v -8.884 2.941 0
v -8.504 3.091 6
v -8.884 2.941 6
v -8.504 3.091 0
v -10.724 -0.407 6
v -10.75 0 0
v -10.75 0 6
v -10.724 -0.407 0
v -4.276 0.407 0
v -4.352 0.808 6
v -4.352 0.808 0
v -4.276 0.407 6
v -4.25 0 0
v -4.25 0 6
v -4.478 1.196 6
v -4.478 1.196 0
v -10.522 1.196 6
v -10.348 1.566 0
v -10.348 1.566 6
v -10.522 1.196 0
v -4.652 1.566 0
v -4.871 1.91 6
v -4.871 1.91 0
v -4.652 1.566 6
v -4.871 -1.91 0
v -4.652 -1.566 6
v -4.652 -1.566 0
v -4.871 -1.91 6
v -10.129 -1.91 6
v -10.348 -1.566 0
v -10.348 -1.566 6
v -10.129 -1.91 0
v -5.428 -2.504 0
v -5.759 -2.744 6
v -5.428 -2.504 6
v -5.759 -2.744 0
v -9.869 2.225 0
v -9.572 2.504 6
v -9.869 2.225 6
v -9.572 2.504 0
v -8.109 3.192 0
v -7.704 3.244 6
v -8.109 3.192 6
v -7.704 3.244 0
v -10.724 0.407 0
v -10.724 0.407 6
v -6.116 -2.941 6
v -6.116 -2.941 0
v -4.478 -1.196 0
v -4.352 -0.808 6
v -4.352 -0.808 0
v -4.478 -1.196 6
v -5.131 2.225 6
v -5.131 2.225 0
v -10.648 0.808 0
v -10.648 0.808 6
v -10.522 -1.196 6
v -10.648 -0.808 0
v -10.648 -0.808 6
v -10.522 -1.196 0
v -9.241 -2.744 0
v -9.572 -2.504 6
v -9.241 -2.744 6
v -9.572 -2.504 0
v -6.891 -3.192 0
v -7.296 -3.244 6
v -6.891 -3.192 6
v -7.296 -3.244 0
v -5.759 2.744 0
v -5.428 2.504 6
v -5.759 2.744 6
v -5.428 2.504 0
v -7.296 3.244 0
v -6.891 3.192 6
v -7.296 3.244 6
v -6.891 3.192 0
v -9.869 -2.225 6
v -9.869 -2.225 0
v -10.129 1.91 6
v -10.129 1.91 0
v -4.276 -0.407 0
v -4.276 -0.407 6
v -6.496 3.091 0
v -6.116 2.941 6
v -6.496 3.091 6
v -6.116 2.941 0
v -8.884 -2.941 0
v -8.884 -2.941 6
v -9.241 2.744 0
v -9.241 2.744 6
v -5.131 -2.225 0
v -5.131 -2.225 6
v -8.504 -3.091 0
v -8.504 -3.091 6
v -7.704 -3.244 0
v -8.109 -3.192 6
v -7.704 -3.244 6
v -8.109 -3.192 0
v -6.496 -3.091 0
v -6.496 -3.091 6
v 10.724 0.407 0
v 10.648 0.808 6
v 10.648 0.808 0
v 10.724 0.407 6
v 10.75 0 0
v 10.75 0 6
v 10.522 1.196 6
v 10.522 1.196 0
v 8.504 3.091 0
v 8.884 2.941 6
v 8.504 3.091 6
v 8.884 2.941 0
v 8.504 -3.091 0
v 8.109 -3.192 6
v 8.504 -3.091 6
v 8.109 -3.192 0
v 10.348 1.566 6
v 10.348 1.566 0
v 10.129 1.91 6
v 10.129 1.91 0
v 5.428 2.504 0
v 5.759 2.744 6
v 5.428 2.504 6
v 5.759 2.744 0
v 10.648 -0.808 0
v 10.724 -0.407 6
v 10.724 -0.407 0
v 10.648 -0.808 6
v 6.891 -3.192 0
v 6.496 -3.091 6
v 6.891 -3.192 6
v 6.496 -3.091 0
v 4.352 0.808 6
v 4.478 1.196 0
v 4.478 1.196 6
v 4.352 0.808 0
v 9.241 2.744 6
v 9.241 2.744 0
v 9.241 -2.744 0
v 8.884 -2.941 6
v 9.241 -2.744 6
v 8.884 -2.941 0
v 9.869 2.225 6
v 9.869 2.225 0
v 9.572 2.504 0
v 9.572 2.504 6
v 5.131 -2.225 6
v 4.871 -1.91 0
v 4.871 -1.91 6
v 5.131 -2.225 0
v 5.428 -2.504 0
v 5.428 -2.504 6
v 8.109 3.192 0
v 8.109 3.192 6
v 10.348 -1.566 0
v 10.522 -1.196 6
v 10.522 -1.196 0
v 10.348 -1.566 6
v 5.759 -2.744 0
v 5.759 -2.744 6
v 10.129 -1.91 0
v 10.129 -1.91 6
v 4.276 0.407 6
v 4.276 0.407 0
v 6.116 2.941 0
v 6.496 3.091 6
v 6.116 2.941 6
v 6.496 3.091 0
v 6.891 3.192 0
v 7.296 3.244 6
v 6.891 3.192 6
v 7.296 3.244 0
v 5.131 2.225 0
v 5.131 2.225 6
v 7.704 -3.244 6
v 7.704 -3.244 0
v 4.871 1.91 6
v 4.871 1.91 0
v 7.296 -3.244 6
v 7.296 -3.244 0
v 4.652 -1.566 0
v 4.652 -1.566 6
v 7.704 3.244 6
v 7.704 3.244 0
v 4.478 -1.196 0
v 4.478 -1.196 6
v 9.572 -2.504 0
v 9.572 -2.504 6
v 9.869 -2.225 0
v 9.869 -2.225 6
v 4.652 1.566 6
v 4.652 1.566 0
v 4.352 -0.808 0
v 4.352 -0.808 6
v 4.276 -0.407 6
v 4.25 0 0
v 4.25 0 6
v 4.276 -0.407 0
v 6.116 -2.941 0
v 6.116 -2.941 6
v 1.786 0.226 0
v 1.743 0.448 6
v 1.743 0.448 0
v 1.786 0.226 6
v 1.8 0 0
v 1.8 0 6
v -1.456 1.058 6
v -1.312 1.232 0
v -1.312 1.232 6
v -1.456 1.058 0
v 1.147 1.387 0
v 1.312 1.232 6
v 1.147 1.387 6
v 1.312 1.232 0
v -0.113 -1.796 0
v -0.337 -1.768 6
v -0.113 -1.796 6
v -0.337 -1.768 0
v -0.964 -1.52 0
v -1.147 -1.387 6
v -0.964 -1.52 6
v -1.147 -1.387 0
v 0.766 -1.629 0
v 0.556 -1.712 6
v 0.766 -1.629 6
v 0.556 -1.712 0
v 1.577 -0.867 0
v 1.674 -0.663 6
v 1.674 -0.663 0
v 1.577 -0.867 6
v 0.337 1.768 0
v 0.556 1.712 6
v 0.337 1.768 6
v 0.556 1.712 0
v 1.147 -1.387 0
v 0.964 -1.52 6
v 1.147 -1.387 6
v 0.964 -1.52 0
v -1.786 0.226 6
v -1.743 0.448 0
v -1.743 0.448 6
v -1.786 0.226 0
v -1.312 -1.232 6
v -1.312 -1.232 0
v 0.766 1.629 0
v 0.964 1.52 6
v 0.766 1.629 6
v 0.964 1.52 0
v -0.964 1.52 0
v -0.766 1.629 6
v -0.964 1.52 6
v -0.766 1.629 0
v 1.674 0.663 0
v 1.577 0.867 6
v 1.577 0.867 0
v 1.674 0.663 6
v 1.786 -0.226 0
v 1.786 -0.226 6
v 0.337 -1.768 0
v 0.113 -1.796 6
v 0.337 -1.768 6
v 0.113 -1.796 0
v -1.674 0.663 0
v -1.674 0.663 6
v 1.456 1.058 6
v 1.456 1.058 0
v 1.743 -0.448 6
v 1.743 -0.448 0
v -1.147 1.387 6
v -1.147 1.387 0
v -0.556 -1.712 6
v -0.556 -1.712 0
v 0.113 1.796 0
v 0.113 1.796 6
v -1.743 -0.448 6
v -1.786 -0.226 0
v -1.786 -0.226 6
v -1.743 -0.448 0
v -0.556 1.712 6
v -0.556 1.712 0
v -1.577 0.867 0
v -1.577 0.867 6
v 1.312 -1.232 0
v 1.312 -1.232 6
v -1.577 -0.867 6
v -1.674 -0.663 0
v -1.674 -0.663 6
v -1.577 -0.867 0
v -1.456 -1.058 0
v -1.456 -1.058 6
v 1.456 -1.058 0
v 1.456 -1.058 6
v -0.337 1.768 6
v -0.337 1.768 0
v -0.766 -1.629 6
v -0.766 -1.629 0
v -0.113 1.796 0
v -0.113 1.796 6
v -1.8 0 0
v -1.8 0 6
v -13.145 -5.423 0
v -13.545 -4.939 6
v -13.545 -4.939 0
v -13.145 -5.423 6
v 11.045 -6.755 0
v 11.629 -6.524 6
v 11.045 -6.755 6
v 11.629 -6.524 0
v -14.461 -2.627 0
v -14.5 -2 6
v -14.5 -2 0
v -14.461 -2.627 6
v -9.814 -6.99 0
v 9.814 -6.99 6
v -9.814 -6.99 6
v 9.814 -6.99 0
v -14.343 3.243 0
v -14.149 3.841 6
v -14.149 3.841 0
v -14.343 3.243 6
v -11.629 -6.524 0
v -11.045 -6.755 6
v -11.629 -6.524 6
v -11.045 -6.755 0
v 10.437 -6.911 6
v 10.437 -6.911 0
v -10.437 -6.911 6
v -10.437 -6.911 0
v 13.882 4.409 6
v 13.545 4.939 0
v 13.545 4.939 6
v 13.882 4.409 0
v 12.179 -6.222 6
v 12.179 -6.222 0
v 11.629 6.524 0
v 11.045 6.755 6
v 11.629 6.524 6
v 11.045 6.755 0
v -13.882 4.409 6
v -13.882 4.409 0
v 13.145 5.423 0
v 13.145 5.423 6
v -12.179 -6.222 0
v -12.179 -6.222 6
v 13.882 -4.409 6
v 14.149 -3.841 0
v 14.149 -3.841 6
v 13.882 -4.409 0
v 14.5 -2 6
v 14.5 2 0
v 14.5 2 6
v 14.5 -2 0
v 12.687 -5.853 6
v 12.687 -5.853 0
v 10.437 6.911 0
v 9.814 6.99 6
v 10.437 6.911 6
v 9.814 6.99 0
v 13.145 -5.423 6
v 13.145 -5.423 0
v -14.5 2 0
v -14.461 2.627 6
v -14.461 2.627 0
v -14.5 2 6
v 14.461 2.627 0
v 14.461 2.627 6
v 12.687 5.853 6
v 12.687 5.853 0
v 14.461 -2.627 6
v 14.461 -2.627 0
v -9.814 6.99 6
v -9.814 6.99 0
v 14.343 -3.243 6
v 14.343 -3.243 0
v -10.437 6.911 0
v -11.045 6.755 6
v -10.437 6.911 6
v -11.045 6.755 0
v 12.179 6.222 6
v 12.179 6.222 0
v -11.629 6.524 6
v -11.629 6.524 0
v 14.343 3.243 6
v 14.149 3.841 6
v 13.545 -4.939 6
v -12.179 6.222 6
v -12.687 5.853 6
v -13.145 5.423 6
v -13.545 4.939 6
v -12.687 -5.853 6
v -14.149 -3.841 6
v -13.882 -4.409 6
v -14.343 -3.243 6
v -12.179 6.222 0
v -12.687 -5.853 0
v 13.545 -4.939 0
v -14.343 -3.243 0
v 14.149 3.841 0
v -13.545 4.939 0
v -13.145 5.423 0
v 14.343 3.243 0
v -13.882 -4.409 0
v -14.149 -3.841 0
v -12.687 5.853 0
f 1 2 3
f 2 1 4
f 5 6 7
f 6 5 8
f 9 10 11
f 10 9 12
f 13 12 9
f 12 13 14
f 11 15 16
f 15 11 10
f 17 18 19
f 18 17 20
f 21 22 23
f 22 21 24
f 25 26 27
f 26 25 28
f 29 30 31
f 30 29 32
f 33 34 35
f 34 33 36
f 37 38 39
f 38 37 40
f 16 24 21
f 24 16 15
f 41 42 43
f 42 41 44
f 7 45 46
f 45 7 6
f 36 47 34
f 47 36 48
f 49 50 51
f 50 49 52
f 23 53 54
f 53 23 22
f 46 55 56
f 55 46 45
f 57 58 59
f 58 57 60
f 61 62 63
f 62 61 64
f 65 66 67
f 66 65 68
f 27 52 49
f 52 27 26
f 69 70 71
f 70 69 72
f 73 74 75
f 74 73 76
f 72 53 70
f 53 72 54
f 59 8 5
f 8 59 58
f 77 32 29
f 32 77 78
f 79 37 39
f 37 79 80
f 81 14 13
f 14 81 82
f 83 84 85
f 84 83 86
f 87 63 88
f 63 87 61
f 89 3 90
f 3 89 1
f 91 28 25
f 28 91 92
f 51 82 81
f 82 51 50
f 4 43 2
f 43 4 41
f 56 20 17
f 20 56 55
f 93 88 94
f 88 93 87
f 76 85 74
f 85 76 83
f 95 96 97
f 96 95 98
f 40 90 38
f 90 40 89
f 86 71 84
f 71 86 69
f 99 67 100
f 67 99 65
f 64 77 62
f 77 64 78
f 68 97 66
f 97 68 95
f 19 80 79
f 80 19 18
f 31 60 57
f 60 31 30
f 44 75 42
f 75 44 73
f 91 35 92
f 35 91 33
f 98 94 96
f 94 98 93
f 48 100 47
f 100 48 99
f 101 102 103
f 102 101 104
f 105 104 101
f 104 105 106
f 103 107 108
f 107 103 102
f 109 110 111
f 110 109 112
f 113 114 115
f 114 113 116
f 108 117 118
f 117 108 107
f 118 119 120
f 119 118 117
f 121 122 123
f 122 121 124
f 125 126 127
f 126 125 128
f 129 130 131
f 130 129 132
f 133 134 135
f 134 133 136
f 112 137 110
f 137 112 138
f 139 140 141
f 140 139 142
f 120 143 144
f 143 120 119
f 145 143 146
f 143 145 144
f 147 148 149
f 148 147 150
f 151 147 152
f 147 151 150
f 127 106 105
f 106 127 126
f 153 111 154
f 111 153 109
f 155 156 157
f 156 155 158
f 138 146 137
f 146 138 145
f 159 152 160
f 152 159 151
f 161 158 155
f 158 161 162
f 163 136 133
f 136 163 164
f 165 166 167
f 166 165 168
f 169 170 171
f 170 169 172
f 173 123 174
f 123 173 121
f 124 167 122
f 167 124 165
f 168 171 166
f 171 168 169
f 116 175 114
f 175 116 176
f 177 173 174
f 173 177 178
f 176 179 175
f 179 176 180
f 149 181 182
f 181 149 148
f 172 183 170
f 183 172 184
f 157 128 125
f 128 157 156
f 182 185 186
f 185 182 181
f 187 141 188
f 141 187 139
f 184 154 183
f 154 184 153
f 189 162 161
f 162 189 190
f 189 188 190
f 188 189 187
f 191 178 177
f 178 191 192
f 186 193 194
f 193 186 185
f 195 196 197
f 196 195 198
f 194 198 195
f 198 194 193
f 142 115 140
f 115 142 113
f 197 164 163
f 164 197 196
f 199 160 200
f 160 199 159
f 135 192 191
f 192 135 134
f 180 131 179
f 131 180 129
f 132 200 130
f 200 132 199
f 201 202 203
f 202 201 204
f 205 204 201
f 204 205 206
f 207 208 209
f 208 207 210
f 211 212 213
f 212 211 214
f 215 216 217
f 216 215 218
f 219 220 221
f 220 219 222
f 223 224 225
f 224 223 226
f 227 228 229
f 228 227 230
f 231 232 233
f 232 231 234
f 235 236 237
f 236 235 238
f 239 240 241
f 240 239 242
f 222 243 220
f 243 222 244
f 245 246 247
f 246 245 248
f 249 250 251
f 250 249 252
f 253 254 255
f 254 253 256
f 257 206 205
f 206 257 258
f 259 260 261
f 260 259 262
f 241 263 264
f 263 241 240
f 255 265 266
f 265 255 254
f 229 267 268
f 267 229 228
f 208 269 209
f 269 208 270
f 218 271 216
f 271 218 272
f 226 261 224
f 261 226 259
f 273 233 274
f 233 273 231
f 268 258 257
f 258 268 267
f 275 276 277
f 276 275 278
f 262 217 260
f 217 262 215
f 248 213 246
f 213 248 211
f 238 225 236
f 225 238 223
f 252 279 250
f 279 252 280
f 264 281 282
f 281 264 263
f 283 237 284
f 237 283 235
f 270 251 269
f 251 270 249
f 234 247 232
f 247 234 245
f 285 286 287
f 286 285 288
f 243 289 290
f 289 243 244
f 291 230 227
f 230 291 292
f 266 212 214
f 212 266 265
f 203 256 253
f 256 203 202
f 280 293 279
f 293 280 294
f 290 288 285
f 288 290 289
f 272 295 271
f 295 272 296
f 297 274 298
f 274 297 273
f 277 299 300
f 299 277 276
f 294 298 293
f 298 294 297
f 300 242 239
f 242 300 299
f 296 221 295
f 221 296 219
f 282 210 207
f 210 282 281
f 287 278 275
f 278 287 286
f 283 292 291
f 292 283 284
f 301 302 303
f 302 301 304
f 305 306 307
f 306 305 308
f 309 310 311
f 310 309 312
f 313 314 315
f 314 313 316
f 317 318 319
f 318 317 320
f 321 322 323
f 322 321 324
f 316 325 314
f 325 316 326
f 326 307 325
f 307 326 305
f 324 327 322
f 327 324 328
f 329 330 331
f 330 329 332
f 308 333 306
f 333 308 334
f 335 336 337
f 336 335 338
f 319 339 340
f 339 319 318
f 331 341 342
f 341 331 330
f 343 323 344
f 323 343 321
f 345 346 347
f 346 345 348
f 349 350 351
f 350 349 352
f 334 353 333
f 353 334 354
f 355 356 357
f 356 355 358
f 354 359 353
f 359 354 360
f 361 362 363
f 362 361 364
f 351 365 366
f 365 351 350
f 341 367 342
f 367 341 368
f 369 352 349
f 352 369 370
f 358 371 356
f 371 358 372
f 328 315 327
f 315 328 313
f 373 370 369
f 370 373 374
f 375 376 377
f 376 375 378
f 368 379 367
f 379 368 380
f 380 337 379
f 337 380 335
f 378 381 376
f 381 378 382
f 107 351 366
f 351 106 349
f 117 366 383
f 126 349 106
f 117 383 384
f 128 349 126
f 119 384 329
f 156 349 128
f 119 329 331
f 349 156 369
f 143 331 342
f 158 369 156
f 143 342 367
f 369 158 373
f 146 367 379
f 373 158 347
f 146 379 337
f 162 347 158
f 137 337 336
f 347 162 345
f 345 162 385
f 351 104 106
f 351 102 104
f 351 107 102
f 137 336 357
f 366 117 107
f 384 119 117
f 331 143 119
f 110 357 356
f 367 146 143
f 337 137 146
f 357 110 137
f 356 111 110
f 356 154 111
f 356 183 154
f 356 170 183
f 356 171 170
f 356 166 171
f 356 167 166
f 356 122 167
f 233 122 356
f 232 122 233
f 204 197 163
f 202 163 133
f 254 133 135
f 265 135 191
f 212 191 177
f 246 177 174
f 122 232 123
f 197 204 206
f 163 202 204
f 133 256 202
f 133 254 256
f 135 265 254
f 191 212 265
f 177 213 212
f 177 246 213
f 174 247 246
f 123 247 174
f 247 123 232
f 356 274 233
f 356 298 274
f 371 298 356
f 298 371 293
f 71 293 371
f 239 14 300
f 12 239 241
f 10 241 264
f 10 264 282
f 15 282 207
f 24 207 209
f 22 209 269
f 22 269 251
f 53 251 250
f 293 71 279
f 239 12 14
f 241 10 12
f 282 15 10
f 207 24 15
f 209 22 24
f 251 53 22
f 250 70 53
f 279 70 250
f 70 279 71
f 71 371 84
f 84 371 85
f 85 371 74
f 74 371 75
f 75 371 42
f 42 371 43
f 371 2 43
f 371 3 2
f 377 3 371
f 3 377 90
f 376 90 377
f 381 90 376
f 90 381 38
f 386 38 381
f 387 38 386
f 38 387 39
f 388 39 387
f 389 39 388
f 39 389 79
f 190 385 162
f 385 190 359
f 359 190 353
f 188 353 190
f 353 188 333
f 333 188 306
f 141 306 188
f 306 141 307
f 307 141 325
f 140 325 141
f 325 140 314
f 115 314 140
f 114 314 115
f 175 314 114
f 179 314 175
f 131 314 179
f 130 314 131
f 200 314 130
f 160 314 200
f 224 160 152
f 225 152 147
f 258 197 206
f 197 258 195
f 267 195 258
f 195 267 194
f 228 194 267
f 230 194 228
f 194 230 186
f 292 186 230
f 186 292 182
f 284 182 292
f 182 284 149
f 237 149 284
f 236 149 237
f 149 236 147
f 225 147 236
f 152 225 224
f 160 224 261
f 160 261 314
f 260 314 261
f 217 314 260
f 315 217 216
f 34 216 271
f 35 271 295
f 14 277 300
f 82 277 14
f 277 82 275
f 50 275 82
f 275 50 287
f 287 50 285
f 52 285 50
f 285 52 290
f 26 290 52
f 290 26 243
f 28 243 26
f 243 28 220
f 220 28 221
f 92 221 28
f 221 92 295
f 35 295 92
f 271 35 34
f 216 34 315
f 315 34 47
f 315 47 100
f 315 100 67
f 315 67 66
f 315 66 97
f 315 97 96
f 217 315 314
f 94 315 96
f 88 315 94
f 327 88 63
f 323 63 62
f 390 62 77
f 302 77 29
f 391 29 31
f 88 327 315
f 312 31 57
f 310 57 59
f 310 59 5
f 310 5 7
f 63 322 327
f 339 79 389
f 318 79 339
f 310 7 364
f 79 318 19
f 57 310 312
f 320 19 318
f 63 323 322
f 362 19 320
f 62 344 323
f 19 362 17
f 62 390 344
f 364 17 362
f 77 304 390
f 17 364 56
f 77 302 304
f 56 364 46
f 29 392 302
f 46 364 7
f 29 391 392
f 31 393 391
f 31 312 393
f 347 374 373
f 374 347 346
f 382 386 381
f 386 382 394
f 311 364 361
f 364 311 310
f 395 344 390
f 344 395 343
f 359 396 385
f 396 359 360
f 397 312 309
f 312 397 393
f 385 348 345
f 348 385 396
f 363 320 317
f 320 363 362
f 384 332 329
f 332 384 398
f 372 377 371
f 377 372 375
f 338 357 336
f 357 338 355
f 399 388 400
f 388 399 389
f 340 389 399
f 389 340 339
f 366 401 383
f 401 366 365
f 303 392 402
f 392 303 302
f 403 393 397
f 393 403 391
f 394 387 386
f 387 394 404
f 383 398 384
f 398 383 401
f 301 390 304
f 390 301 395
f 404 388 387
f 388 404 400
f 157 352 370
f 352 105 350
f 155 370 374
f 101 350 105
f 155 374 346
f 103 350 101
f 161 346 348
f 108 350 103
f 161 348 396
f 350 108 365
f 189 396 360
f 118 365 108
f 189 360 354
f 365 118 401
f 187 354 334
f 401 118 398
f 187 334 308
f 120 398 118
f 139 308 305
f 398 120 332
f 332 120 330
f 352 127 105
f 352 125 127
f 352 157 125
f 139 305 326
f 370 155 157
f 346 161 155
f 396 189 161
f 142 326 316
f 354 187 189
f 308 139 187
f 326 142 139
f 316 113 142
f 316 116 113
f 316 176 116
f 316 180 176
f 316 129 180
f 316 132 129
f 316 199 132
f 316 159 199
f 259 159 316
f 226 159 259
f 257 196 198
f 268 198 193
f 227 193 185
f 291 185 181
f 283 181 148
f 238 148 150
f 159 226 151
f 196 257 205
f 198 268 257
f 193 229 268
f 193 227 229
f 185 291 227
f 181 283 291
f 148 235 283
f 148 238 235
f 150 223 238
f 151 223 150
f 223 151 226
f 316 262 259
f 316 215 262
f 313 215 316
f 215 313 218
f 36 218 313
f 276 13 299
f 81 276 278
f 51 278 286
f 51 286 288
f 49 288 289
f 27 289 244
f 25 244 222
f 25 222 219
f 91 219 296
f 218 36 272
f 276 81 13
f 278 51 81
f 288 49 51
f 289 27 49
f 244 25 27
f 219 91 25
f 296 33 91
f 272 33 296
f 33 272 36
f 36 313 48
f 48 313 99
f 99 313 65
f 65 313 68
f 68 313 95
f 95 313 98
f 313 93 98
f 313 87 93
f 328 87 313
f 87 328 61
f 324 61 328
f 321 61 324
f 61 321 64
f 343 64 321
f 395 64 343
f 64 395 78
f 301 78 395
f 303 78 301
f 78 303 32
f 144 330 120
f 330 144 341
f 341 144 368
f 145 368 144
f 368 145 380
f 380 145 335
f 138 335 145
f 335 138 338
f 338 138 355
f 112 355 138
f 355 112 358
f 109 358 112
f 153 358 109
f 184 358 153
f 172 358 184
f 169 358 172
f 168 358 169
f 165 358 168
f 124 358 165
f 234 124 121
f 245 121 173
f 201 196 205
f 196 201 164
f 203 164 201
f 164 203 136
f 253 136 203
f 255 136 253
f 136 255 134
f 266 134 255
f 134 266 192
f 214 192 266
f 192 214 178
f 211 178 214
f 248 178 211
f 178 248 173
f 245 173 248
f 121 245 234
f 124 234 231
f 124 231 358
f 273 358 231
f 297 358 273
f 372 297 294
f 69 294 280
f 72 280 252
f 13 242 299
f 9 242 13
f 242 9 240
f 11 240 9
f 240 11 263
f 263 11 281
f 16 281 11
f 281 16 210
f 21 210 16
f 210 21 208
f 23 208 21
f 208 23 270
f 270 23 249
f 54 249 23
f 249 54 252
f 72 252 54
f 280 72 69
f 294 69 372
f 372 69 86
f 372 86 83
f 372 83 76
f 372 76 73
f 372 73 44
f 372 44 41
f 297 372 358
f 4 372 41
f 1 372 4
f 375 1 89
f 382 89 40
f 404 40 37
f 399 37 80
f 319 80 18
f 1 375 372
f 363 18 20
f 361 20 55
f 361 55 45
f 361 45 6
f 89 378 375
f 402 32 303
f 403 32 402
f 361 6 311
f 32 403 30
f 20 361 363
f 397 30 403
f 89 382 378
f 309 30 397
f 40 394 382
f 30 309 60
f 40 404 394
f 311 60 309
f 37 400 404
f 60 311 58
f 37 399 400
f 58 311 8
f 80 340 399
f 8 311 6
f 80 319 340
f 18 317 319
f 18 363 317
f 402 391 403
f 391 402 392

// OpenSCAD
$fn = 50;


difference() {
	union() {
		*color(alpha = 1.0000000000, c = "gray") {
			translate(v = [0, 7, 0]) {
				linear_extrude(height = 1) {
					text(font = "Arial:style=Bold", halign = "center", size = 4.5000000000, text = "COMMENT plate main", valign = "center");
				}
			}
		}
		hull() {
			translate(v = [-9.5000000000, 2.0000000000, 0]) {
				cylinder(h = 6, r = 5);
			}
			translate(v = [9.5000000000, 2.0000000000, 0]) {
				cylinder(h = 6, r = 5);
			}
			translate(v = [-9.5000000000, -2.0000000000, 0]) {
				cylinder(h = 6, r = 5);
			}
			translate(v = [9.5000000000, -2.0000000000, 0]) {
				cylinder(h = 6, r = 5);
			}
		}
	}
	union() {
		*color(alpha = 1.0000000000, c = "gray") {
			translate(v = [0, 7, 0]) {
				linear_extrude(height = 1) {
					text(font = "Arial:style=Bold", halign = "center", size = 4.5000000000, text = "COMMENT holes main", valign = "center");
				}
			}
		}
		translate(v = [-7.5000000000, 0.0000000000, 0]) {
			translate(v = [0, 0, -100]) {
				cylinder(h = 200, r = 3.2500000000);
			}
		}
		translate(v = [7.5000000000, 0.0000000000, 0]) {
			translate(v = [0, 0, -100]) {
				cylinder(h = 200, r = 3.2500000000);
			}
		}
		translate(v = [-7.5000000000, 0.0000000000, 0]) {
			translate(v = [0, 0, -100]) {
				cylinder(h = 200, r = 1.8000000000);
			}
		}
		translate(v = [0, 0, -100]) {
			cylinder(h = 200, r = 1.8000000000);
		}
		translate(v = [7.5000000000, 0.0000000000, 0]) {
			translate(v = [0, 0, -100]) {
				cylinder(h = 200, r = 1.8000000000);
			}
		}
	}
}
